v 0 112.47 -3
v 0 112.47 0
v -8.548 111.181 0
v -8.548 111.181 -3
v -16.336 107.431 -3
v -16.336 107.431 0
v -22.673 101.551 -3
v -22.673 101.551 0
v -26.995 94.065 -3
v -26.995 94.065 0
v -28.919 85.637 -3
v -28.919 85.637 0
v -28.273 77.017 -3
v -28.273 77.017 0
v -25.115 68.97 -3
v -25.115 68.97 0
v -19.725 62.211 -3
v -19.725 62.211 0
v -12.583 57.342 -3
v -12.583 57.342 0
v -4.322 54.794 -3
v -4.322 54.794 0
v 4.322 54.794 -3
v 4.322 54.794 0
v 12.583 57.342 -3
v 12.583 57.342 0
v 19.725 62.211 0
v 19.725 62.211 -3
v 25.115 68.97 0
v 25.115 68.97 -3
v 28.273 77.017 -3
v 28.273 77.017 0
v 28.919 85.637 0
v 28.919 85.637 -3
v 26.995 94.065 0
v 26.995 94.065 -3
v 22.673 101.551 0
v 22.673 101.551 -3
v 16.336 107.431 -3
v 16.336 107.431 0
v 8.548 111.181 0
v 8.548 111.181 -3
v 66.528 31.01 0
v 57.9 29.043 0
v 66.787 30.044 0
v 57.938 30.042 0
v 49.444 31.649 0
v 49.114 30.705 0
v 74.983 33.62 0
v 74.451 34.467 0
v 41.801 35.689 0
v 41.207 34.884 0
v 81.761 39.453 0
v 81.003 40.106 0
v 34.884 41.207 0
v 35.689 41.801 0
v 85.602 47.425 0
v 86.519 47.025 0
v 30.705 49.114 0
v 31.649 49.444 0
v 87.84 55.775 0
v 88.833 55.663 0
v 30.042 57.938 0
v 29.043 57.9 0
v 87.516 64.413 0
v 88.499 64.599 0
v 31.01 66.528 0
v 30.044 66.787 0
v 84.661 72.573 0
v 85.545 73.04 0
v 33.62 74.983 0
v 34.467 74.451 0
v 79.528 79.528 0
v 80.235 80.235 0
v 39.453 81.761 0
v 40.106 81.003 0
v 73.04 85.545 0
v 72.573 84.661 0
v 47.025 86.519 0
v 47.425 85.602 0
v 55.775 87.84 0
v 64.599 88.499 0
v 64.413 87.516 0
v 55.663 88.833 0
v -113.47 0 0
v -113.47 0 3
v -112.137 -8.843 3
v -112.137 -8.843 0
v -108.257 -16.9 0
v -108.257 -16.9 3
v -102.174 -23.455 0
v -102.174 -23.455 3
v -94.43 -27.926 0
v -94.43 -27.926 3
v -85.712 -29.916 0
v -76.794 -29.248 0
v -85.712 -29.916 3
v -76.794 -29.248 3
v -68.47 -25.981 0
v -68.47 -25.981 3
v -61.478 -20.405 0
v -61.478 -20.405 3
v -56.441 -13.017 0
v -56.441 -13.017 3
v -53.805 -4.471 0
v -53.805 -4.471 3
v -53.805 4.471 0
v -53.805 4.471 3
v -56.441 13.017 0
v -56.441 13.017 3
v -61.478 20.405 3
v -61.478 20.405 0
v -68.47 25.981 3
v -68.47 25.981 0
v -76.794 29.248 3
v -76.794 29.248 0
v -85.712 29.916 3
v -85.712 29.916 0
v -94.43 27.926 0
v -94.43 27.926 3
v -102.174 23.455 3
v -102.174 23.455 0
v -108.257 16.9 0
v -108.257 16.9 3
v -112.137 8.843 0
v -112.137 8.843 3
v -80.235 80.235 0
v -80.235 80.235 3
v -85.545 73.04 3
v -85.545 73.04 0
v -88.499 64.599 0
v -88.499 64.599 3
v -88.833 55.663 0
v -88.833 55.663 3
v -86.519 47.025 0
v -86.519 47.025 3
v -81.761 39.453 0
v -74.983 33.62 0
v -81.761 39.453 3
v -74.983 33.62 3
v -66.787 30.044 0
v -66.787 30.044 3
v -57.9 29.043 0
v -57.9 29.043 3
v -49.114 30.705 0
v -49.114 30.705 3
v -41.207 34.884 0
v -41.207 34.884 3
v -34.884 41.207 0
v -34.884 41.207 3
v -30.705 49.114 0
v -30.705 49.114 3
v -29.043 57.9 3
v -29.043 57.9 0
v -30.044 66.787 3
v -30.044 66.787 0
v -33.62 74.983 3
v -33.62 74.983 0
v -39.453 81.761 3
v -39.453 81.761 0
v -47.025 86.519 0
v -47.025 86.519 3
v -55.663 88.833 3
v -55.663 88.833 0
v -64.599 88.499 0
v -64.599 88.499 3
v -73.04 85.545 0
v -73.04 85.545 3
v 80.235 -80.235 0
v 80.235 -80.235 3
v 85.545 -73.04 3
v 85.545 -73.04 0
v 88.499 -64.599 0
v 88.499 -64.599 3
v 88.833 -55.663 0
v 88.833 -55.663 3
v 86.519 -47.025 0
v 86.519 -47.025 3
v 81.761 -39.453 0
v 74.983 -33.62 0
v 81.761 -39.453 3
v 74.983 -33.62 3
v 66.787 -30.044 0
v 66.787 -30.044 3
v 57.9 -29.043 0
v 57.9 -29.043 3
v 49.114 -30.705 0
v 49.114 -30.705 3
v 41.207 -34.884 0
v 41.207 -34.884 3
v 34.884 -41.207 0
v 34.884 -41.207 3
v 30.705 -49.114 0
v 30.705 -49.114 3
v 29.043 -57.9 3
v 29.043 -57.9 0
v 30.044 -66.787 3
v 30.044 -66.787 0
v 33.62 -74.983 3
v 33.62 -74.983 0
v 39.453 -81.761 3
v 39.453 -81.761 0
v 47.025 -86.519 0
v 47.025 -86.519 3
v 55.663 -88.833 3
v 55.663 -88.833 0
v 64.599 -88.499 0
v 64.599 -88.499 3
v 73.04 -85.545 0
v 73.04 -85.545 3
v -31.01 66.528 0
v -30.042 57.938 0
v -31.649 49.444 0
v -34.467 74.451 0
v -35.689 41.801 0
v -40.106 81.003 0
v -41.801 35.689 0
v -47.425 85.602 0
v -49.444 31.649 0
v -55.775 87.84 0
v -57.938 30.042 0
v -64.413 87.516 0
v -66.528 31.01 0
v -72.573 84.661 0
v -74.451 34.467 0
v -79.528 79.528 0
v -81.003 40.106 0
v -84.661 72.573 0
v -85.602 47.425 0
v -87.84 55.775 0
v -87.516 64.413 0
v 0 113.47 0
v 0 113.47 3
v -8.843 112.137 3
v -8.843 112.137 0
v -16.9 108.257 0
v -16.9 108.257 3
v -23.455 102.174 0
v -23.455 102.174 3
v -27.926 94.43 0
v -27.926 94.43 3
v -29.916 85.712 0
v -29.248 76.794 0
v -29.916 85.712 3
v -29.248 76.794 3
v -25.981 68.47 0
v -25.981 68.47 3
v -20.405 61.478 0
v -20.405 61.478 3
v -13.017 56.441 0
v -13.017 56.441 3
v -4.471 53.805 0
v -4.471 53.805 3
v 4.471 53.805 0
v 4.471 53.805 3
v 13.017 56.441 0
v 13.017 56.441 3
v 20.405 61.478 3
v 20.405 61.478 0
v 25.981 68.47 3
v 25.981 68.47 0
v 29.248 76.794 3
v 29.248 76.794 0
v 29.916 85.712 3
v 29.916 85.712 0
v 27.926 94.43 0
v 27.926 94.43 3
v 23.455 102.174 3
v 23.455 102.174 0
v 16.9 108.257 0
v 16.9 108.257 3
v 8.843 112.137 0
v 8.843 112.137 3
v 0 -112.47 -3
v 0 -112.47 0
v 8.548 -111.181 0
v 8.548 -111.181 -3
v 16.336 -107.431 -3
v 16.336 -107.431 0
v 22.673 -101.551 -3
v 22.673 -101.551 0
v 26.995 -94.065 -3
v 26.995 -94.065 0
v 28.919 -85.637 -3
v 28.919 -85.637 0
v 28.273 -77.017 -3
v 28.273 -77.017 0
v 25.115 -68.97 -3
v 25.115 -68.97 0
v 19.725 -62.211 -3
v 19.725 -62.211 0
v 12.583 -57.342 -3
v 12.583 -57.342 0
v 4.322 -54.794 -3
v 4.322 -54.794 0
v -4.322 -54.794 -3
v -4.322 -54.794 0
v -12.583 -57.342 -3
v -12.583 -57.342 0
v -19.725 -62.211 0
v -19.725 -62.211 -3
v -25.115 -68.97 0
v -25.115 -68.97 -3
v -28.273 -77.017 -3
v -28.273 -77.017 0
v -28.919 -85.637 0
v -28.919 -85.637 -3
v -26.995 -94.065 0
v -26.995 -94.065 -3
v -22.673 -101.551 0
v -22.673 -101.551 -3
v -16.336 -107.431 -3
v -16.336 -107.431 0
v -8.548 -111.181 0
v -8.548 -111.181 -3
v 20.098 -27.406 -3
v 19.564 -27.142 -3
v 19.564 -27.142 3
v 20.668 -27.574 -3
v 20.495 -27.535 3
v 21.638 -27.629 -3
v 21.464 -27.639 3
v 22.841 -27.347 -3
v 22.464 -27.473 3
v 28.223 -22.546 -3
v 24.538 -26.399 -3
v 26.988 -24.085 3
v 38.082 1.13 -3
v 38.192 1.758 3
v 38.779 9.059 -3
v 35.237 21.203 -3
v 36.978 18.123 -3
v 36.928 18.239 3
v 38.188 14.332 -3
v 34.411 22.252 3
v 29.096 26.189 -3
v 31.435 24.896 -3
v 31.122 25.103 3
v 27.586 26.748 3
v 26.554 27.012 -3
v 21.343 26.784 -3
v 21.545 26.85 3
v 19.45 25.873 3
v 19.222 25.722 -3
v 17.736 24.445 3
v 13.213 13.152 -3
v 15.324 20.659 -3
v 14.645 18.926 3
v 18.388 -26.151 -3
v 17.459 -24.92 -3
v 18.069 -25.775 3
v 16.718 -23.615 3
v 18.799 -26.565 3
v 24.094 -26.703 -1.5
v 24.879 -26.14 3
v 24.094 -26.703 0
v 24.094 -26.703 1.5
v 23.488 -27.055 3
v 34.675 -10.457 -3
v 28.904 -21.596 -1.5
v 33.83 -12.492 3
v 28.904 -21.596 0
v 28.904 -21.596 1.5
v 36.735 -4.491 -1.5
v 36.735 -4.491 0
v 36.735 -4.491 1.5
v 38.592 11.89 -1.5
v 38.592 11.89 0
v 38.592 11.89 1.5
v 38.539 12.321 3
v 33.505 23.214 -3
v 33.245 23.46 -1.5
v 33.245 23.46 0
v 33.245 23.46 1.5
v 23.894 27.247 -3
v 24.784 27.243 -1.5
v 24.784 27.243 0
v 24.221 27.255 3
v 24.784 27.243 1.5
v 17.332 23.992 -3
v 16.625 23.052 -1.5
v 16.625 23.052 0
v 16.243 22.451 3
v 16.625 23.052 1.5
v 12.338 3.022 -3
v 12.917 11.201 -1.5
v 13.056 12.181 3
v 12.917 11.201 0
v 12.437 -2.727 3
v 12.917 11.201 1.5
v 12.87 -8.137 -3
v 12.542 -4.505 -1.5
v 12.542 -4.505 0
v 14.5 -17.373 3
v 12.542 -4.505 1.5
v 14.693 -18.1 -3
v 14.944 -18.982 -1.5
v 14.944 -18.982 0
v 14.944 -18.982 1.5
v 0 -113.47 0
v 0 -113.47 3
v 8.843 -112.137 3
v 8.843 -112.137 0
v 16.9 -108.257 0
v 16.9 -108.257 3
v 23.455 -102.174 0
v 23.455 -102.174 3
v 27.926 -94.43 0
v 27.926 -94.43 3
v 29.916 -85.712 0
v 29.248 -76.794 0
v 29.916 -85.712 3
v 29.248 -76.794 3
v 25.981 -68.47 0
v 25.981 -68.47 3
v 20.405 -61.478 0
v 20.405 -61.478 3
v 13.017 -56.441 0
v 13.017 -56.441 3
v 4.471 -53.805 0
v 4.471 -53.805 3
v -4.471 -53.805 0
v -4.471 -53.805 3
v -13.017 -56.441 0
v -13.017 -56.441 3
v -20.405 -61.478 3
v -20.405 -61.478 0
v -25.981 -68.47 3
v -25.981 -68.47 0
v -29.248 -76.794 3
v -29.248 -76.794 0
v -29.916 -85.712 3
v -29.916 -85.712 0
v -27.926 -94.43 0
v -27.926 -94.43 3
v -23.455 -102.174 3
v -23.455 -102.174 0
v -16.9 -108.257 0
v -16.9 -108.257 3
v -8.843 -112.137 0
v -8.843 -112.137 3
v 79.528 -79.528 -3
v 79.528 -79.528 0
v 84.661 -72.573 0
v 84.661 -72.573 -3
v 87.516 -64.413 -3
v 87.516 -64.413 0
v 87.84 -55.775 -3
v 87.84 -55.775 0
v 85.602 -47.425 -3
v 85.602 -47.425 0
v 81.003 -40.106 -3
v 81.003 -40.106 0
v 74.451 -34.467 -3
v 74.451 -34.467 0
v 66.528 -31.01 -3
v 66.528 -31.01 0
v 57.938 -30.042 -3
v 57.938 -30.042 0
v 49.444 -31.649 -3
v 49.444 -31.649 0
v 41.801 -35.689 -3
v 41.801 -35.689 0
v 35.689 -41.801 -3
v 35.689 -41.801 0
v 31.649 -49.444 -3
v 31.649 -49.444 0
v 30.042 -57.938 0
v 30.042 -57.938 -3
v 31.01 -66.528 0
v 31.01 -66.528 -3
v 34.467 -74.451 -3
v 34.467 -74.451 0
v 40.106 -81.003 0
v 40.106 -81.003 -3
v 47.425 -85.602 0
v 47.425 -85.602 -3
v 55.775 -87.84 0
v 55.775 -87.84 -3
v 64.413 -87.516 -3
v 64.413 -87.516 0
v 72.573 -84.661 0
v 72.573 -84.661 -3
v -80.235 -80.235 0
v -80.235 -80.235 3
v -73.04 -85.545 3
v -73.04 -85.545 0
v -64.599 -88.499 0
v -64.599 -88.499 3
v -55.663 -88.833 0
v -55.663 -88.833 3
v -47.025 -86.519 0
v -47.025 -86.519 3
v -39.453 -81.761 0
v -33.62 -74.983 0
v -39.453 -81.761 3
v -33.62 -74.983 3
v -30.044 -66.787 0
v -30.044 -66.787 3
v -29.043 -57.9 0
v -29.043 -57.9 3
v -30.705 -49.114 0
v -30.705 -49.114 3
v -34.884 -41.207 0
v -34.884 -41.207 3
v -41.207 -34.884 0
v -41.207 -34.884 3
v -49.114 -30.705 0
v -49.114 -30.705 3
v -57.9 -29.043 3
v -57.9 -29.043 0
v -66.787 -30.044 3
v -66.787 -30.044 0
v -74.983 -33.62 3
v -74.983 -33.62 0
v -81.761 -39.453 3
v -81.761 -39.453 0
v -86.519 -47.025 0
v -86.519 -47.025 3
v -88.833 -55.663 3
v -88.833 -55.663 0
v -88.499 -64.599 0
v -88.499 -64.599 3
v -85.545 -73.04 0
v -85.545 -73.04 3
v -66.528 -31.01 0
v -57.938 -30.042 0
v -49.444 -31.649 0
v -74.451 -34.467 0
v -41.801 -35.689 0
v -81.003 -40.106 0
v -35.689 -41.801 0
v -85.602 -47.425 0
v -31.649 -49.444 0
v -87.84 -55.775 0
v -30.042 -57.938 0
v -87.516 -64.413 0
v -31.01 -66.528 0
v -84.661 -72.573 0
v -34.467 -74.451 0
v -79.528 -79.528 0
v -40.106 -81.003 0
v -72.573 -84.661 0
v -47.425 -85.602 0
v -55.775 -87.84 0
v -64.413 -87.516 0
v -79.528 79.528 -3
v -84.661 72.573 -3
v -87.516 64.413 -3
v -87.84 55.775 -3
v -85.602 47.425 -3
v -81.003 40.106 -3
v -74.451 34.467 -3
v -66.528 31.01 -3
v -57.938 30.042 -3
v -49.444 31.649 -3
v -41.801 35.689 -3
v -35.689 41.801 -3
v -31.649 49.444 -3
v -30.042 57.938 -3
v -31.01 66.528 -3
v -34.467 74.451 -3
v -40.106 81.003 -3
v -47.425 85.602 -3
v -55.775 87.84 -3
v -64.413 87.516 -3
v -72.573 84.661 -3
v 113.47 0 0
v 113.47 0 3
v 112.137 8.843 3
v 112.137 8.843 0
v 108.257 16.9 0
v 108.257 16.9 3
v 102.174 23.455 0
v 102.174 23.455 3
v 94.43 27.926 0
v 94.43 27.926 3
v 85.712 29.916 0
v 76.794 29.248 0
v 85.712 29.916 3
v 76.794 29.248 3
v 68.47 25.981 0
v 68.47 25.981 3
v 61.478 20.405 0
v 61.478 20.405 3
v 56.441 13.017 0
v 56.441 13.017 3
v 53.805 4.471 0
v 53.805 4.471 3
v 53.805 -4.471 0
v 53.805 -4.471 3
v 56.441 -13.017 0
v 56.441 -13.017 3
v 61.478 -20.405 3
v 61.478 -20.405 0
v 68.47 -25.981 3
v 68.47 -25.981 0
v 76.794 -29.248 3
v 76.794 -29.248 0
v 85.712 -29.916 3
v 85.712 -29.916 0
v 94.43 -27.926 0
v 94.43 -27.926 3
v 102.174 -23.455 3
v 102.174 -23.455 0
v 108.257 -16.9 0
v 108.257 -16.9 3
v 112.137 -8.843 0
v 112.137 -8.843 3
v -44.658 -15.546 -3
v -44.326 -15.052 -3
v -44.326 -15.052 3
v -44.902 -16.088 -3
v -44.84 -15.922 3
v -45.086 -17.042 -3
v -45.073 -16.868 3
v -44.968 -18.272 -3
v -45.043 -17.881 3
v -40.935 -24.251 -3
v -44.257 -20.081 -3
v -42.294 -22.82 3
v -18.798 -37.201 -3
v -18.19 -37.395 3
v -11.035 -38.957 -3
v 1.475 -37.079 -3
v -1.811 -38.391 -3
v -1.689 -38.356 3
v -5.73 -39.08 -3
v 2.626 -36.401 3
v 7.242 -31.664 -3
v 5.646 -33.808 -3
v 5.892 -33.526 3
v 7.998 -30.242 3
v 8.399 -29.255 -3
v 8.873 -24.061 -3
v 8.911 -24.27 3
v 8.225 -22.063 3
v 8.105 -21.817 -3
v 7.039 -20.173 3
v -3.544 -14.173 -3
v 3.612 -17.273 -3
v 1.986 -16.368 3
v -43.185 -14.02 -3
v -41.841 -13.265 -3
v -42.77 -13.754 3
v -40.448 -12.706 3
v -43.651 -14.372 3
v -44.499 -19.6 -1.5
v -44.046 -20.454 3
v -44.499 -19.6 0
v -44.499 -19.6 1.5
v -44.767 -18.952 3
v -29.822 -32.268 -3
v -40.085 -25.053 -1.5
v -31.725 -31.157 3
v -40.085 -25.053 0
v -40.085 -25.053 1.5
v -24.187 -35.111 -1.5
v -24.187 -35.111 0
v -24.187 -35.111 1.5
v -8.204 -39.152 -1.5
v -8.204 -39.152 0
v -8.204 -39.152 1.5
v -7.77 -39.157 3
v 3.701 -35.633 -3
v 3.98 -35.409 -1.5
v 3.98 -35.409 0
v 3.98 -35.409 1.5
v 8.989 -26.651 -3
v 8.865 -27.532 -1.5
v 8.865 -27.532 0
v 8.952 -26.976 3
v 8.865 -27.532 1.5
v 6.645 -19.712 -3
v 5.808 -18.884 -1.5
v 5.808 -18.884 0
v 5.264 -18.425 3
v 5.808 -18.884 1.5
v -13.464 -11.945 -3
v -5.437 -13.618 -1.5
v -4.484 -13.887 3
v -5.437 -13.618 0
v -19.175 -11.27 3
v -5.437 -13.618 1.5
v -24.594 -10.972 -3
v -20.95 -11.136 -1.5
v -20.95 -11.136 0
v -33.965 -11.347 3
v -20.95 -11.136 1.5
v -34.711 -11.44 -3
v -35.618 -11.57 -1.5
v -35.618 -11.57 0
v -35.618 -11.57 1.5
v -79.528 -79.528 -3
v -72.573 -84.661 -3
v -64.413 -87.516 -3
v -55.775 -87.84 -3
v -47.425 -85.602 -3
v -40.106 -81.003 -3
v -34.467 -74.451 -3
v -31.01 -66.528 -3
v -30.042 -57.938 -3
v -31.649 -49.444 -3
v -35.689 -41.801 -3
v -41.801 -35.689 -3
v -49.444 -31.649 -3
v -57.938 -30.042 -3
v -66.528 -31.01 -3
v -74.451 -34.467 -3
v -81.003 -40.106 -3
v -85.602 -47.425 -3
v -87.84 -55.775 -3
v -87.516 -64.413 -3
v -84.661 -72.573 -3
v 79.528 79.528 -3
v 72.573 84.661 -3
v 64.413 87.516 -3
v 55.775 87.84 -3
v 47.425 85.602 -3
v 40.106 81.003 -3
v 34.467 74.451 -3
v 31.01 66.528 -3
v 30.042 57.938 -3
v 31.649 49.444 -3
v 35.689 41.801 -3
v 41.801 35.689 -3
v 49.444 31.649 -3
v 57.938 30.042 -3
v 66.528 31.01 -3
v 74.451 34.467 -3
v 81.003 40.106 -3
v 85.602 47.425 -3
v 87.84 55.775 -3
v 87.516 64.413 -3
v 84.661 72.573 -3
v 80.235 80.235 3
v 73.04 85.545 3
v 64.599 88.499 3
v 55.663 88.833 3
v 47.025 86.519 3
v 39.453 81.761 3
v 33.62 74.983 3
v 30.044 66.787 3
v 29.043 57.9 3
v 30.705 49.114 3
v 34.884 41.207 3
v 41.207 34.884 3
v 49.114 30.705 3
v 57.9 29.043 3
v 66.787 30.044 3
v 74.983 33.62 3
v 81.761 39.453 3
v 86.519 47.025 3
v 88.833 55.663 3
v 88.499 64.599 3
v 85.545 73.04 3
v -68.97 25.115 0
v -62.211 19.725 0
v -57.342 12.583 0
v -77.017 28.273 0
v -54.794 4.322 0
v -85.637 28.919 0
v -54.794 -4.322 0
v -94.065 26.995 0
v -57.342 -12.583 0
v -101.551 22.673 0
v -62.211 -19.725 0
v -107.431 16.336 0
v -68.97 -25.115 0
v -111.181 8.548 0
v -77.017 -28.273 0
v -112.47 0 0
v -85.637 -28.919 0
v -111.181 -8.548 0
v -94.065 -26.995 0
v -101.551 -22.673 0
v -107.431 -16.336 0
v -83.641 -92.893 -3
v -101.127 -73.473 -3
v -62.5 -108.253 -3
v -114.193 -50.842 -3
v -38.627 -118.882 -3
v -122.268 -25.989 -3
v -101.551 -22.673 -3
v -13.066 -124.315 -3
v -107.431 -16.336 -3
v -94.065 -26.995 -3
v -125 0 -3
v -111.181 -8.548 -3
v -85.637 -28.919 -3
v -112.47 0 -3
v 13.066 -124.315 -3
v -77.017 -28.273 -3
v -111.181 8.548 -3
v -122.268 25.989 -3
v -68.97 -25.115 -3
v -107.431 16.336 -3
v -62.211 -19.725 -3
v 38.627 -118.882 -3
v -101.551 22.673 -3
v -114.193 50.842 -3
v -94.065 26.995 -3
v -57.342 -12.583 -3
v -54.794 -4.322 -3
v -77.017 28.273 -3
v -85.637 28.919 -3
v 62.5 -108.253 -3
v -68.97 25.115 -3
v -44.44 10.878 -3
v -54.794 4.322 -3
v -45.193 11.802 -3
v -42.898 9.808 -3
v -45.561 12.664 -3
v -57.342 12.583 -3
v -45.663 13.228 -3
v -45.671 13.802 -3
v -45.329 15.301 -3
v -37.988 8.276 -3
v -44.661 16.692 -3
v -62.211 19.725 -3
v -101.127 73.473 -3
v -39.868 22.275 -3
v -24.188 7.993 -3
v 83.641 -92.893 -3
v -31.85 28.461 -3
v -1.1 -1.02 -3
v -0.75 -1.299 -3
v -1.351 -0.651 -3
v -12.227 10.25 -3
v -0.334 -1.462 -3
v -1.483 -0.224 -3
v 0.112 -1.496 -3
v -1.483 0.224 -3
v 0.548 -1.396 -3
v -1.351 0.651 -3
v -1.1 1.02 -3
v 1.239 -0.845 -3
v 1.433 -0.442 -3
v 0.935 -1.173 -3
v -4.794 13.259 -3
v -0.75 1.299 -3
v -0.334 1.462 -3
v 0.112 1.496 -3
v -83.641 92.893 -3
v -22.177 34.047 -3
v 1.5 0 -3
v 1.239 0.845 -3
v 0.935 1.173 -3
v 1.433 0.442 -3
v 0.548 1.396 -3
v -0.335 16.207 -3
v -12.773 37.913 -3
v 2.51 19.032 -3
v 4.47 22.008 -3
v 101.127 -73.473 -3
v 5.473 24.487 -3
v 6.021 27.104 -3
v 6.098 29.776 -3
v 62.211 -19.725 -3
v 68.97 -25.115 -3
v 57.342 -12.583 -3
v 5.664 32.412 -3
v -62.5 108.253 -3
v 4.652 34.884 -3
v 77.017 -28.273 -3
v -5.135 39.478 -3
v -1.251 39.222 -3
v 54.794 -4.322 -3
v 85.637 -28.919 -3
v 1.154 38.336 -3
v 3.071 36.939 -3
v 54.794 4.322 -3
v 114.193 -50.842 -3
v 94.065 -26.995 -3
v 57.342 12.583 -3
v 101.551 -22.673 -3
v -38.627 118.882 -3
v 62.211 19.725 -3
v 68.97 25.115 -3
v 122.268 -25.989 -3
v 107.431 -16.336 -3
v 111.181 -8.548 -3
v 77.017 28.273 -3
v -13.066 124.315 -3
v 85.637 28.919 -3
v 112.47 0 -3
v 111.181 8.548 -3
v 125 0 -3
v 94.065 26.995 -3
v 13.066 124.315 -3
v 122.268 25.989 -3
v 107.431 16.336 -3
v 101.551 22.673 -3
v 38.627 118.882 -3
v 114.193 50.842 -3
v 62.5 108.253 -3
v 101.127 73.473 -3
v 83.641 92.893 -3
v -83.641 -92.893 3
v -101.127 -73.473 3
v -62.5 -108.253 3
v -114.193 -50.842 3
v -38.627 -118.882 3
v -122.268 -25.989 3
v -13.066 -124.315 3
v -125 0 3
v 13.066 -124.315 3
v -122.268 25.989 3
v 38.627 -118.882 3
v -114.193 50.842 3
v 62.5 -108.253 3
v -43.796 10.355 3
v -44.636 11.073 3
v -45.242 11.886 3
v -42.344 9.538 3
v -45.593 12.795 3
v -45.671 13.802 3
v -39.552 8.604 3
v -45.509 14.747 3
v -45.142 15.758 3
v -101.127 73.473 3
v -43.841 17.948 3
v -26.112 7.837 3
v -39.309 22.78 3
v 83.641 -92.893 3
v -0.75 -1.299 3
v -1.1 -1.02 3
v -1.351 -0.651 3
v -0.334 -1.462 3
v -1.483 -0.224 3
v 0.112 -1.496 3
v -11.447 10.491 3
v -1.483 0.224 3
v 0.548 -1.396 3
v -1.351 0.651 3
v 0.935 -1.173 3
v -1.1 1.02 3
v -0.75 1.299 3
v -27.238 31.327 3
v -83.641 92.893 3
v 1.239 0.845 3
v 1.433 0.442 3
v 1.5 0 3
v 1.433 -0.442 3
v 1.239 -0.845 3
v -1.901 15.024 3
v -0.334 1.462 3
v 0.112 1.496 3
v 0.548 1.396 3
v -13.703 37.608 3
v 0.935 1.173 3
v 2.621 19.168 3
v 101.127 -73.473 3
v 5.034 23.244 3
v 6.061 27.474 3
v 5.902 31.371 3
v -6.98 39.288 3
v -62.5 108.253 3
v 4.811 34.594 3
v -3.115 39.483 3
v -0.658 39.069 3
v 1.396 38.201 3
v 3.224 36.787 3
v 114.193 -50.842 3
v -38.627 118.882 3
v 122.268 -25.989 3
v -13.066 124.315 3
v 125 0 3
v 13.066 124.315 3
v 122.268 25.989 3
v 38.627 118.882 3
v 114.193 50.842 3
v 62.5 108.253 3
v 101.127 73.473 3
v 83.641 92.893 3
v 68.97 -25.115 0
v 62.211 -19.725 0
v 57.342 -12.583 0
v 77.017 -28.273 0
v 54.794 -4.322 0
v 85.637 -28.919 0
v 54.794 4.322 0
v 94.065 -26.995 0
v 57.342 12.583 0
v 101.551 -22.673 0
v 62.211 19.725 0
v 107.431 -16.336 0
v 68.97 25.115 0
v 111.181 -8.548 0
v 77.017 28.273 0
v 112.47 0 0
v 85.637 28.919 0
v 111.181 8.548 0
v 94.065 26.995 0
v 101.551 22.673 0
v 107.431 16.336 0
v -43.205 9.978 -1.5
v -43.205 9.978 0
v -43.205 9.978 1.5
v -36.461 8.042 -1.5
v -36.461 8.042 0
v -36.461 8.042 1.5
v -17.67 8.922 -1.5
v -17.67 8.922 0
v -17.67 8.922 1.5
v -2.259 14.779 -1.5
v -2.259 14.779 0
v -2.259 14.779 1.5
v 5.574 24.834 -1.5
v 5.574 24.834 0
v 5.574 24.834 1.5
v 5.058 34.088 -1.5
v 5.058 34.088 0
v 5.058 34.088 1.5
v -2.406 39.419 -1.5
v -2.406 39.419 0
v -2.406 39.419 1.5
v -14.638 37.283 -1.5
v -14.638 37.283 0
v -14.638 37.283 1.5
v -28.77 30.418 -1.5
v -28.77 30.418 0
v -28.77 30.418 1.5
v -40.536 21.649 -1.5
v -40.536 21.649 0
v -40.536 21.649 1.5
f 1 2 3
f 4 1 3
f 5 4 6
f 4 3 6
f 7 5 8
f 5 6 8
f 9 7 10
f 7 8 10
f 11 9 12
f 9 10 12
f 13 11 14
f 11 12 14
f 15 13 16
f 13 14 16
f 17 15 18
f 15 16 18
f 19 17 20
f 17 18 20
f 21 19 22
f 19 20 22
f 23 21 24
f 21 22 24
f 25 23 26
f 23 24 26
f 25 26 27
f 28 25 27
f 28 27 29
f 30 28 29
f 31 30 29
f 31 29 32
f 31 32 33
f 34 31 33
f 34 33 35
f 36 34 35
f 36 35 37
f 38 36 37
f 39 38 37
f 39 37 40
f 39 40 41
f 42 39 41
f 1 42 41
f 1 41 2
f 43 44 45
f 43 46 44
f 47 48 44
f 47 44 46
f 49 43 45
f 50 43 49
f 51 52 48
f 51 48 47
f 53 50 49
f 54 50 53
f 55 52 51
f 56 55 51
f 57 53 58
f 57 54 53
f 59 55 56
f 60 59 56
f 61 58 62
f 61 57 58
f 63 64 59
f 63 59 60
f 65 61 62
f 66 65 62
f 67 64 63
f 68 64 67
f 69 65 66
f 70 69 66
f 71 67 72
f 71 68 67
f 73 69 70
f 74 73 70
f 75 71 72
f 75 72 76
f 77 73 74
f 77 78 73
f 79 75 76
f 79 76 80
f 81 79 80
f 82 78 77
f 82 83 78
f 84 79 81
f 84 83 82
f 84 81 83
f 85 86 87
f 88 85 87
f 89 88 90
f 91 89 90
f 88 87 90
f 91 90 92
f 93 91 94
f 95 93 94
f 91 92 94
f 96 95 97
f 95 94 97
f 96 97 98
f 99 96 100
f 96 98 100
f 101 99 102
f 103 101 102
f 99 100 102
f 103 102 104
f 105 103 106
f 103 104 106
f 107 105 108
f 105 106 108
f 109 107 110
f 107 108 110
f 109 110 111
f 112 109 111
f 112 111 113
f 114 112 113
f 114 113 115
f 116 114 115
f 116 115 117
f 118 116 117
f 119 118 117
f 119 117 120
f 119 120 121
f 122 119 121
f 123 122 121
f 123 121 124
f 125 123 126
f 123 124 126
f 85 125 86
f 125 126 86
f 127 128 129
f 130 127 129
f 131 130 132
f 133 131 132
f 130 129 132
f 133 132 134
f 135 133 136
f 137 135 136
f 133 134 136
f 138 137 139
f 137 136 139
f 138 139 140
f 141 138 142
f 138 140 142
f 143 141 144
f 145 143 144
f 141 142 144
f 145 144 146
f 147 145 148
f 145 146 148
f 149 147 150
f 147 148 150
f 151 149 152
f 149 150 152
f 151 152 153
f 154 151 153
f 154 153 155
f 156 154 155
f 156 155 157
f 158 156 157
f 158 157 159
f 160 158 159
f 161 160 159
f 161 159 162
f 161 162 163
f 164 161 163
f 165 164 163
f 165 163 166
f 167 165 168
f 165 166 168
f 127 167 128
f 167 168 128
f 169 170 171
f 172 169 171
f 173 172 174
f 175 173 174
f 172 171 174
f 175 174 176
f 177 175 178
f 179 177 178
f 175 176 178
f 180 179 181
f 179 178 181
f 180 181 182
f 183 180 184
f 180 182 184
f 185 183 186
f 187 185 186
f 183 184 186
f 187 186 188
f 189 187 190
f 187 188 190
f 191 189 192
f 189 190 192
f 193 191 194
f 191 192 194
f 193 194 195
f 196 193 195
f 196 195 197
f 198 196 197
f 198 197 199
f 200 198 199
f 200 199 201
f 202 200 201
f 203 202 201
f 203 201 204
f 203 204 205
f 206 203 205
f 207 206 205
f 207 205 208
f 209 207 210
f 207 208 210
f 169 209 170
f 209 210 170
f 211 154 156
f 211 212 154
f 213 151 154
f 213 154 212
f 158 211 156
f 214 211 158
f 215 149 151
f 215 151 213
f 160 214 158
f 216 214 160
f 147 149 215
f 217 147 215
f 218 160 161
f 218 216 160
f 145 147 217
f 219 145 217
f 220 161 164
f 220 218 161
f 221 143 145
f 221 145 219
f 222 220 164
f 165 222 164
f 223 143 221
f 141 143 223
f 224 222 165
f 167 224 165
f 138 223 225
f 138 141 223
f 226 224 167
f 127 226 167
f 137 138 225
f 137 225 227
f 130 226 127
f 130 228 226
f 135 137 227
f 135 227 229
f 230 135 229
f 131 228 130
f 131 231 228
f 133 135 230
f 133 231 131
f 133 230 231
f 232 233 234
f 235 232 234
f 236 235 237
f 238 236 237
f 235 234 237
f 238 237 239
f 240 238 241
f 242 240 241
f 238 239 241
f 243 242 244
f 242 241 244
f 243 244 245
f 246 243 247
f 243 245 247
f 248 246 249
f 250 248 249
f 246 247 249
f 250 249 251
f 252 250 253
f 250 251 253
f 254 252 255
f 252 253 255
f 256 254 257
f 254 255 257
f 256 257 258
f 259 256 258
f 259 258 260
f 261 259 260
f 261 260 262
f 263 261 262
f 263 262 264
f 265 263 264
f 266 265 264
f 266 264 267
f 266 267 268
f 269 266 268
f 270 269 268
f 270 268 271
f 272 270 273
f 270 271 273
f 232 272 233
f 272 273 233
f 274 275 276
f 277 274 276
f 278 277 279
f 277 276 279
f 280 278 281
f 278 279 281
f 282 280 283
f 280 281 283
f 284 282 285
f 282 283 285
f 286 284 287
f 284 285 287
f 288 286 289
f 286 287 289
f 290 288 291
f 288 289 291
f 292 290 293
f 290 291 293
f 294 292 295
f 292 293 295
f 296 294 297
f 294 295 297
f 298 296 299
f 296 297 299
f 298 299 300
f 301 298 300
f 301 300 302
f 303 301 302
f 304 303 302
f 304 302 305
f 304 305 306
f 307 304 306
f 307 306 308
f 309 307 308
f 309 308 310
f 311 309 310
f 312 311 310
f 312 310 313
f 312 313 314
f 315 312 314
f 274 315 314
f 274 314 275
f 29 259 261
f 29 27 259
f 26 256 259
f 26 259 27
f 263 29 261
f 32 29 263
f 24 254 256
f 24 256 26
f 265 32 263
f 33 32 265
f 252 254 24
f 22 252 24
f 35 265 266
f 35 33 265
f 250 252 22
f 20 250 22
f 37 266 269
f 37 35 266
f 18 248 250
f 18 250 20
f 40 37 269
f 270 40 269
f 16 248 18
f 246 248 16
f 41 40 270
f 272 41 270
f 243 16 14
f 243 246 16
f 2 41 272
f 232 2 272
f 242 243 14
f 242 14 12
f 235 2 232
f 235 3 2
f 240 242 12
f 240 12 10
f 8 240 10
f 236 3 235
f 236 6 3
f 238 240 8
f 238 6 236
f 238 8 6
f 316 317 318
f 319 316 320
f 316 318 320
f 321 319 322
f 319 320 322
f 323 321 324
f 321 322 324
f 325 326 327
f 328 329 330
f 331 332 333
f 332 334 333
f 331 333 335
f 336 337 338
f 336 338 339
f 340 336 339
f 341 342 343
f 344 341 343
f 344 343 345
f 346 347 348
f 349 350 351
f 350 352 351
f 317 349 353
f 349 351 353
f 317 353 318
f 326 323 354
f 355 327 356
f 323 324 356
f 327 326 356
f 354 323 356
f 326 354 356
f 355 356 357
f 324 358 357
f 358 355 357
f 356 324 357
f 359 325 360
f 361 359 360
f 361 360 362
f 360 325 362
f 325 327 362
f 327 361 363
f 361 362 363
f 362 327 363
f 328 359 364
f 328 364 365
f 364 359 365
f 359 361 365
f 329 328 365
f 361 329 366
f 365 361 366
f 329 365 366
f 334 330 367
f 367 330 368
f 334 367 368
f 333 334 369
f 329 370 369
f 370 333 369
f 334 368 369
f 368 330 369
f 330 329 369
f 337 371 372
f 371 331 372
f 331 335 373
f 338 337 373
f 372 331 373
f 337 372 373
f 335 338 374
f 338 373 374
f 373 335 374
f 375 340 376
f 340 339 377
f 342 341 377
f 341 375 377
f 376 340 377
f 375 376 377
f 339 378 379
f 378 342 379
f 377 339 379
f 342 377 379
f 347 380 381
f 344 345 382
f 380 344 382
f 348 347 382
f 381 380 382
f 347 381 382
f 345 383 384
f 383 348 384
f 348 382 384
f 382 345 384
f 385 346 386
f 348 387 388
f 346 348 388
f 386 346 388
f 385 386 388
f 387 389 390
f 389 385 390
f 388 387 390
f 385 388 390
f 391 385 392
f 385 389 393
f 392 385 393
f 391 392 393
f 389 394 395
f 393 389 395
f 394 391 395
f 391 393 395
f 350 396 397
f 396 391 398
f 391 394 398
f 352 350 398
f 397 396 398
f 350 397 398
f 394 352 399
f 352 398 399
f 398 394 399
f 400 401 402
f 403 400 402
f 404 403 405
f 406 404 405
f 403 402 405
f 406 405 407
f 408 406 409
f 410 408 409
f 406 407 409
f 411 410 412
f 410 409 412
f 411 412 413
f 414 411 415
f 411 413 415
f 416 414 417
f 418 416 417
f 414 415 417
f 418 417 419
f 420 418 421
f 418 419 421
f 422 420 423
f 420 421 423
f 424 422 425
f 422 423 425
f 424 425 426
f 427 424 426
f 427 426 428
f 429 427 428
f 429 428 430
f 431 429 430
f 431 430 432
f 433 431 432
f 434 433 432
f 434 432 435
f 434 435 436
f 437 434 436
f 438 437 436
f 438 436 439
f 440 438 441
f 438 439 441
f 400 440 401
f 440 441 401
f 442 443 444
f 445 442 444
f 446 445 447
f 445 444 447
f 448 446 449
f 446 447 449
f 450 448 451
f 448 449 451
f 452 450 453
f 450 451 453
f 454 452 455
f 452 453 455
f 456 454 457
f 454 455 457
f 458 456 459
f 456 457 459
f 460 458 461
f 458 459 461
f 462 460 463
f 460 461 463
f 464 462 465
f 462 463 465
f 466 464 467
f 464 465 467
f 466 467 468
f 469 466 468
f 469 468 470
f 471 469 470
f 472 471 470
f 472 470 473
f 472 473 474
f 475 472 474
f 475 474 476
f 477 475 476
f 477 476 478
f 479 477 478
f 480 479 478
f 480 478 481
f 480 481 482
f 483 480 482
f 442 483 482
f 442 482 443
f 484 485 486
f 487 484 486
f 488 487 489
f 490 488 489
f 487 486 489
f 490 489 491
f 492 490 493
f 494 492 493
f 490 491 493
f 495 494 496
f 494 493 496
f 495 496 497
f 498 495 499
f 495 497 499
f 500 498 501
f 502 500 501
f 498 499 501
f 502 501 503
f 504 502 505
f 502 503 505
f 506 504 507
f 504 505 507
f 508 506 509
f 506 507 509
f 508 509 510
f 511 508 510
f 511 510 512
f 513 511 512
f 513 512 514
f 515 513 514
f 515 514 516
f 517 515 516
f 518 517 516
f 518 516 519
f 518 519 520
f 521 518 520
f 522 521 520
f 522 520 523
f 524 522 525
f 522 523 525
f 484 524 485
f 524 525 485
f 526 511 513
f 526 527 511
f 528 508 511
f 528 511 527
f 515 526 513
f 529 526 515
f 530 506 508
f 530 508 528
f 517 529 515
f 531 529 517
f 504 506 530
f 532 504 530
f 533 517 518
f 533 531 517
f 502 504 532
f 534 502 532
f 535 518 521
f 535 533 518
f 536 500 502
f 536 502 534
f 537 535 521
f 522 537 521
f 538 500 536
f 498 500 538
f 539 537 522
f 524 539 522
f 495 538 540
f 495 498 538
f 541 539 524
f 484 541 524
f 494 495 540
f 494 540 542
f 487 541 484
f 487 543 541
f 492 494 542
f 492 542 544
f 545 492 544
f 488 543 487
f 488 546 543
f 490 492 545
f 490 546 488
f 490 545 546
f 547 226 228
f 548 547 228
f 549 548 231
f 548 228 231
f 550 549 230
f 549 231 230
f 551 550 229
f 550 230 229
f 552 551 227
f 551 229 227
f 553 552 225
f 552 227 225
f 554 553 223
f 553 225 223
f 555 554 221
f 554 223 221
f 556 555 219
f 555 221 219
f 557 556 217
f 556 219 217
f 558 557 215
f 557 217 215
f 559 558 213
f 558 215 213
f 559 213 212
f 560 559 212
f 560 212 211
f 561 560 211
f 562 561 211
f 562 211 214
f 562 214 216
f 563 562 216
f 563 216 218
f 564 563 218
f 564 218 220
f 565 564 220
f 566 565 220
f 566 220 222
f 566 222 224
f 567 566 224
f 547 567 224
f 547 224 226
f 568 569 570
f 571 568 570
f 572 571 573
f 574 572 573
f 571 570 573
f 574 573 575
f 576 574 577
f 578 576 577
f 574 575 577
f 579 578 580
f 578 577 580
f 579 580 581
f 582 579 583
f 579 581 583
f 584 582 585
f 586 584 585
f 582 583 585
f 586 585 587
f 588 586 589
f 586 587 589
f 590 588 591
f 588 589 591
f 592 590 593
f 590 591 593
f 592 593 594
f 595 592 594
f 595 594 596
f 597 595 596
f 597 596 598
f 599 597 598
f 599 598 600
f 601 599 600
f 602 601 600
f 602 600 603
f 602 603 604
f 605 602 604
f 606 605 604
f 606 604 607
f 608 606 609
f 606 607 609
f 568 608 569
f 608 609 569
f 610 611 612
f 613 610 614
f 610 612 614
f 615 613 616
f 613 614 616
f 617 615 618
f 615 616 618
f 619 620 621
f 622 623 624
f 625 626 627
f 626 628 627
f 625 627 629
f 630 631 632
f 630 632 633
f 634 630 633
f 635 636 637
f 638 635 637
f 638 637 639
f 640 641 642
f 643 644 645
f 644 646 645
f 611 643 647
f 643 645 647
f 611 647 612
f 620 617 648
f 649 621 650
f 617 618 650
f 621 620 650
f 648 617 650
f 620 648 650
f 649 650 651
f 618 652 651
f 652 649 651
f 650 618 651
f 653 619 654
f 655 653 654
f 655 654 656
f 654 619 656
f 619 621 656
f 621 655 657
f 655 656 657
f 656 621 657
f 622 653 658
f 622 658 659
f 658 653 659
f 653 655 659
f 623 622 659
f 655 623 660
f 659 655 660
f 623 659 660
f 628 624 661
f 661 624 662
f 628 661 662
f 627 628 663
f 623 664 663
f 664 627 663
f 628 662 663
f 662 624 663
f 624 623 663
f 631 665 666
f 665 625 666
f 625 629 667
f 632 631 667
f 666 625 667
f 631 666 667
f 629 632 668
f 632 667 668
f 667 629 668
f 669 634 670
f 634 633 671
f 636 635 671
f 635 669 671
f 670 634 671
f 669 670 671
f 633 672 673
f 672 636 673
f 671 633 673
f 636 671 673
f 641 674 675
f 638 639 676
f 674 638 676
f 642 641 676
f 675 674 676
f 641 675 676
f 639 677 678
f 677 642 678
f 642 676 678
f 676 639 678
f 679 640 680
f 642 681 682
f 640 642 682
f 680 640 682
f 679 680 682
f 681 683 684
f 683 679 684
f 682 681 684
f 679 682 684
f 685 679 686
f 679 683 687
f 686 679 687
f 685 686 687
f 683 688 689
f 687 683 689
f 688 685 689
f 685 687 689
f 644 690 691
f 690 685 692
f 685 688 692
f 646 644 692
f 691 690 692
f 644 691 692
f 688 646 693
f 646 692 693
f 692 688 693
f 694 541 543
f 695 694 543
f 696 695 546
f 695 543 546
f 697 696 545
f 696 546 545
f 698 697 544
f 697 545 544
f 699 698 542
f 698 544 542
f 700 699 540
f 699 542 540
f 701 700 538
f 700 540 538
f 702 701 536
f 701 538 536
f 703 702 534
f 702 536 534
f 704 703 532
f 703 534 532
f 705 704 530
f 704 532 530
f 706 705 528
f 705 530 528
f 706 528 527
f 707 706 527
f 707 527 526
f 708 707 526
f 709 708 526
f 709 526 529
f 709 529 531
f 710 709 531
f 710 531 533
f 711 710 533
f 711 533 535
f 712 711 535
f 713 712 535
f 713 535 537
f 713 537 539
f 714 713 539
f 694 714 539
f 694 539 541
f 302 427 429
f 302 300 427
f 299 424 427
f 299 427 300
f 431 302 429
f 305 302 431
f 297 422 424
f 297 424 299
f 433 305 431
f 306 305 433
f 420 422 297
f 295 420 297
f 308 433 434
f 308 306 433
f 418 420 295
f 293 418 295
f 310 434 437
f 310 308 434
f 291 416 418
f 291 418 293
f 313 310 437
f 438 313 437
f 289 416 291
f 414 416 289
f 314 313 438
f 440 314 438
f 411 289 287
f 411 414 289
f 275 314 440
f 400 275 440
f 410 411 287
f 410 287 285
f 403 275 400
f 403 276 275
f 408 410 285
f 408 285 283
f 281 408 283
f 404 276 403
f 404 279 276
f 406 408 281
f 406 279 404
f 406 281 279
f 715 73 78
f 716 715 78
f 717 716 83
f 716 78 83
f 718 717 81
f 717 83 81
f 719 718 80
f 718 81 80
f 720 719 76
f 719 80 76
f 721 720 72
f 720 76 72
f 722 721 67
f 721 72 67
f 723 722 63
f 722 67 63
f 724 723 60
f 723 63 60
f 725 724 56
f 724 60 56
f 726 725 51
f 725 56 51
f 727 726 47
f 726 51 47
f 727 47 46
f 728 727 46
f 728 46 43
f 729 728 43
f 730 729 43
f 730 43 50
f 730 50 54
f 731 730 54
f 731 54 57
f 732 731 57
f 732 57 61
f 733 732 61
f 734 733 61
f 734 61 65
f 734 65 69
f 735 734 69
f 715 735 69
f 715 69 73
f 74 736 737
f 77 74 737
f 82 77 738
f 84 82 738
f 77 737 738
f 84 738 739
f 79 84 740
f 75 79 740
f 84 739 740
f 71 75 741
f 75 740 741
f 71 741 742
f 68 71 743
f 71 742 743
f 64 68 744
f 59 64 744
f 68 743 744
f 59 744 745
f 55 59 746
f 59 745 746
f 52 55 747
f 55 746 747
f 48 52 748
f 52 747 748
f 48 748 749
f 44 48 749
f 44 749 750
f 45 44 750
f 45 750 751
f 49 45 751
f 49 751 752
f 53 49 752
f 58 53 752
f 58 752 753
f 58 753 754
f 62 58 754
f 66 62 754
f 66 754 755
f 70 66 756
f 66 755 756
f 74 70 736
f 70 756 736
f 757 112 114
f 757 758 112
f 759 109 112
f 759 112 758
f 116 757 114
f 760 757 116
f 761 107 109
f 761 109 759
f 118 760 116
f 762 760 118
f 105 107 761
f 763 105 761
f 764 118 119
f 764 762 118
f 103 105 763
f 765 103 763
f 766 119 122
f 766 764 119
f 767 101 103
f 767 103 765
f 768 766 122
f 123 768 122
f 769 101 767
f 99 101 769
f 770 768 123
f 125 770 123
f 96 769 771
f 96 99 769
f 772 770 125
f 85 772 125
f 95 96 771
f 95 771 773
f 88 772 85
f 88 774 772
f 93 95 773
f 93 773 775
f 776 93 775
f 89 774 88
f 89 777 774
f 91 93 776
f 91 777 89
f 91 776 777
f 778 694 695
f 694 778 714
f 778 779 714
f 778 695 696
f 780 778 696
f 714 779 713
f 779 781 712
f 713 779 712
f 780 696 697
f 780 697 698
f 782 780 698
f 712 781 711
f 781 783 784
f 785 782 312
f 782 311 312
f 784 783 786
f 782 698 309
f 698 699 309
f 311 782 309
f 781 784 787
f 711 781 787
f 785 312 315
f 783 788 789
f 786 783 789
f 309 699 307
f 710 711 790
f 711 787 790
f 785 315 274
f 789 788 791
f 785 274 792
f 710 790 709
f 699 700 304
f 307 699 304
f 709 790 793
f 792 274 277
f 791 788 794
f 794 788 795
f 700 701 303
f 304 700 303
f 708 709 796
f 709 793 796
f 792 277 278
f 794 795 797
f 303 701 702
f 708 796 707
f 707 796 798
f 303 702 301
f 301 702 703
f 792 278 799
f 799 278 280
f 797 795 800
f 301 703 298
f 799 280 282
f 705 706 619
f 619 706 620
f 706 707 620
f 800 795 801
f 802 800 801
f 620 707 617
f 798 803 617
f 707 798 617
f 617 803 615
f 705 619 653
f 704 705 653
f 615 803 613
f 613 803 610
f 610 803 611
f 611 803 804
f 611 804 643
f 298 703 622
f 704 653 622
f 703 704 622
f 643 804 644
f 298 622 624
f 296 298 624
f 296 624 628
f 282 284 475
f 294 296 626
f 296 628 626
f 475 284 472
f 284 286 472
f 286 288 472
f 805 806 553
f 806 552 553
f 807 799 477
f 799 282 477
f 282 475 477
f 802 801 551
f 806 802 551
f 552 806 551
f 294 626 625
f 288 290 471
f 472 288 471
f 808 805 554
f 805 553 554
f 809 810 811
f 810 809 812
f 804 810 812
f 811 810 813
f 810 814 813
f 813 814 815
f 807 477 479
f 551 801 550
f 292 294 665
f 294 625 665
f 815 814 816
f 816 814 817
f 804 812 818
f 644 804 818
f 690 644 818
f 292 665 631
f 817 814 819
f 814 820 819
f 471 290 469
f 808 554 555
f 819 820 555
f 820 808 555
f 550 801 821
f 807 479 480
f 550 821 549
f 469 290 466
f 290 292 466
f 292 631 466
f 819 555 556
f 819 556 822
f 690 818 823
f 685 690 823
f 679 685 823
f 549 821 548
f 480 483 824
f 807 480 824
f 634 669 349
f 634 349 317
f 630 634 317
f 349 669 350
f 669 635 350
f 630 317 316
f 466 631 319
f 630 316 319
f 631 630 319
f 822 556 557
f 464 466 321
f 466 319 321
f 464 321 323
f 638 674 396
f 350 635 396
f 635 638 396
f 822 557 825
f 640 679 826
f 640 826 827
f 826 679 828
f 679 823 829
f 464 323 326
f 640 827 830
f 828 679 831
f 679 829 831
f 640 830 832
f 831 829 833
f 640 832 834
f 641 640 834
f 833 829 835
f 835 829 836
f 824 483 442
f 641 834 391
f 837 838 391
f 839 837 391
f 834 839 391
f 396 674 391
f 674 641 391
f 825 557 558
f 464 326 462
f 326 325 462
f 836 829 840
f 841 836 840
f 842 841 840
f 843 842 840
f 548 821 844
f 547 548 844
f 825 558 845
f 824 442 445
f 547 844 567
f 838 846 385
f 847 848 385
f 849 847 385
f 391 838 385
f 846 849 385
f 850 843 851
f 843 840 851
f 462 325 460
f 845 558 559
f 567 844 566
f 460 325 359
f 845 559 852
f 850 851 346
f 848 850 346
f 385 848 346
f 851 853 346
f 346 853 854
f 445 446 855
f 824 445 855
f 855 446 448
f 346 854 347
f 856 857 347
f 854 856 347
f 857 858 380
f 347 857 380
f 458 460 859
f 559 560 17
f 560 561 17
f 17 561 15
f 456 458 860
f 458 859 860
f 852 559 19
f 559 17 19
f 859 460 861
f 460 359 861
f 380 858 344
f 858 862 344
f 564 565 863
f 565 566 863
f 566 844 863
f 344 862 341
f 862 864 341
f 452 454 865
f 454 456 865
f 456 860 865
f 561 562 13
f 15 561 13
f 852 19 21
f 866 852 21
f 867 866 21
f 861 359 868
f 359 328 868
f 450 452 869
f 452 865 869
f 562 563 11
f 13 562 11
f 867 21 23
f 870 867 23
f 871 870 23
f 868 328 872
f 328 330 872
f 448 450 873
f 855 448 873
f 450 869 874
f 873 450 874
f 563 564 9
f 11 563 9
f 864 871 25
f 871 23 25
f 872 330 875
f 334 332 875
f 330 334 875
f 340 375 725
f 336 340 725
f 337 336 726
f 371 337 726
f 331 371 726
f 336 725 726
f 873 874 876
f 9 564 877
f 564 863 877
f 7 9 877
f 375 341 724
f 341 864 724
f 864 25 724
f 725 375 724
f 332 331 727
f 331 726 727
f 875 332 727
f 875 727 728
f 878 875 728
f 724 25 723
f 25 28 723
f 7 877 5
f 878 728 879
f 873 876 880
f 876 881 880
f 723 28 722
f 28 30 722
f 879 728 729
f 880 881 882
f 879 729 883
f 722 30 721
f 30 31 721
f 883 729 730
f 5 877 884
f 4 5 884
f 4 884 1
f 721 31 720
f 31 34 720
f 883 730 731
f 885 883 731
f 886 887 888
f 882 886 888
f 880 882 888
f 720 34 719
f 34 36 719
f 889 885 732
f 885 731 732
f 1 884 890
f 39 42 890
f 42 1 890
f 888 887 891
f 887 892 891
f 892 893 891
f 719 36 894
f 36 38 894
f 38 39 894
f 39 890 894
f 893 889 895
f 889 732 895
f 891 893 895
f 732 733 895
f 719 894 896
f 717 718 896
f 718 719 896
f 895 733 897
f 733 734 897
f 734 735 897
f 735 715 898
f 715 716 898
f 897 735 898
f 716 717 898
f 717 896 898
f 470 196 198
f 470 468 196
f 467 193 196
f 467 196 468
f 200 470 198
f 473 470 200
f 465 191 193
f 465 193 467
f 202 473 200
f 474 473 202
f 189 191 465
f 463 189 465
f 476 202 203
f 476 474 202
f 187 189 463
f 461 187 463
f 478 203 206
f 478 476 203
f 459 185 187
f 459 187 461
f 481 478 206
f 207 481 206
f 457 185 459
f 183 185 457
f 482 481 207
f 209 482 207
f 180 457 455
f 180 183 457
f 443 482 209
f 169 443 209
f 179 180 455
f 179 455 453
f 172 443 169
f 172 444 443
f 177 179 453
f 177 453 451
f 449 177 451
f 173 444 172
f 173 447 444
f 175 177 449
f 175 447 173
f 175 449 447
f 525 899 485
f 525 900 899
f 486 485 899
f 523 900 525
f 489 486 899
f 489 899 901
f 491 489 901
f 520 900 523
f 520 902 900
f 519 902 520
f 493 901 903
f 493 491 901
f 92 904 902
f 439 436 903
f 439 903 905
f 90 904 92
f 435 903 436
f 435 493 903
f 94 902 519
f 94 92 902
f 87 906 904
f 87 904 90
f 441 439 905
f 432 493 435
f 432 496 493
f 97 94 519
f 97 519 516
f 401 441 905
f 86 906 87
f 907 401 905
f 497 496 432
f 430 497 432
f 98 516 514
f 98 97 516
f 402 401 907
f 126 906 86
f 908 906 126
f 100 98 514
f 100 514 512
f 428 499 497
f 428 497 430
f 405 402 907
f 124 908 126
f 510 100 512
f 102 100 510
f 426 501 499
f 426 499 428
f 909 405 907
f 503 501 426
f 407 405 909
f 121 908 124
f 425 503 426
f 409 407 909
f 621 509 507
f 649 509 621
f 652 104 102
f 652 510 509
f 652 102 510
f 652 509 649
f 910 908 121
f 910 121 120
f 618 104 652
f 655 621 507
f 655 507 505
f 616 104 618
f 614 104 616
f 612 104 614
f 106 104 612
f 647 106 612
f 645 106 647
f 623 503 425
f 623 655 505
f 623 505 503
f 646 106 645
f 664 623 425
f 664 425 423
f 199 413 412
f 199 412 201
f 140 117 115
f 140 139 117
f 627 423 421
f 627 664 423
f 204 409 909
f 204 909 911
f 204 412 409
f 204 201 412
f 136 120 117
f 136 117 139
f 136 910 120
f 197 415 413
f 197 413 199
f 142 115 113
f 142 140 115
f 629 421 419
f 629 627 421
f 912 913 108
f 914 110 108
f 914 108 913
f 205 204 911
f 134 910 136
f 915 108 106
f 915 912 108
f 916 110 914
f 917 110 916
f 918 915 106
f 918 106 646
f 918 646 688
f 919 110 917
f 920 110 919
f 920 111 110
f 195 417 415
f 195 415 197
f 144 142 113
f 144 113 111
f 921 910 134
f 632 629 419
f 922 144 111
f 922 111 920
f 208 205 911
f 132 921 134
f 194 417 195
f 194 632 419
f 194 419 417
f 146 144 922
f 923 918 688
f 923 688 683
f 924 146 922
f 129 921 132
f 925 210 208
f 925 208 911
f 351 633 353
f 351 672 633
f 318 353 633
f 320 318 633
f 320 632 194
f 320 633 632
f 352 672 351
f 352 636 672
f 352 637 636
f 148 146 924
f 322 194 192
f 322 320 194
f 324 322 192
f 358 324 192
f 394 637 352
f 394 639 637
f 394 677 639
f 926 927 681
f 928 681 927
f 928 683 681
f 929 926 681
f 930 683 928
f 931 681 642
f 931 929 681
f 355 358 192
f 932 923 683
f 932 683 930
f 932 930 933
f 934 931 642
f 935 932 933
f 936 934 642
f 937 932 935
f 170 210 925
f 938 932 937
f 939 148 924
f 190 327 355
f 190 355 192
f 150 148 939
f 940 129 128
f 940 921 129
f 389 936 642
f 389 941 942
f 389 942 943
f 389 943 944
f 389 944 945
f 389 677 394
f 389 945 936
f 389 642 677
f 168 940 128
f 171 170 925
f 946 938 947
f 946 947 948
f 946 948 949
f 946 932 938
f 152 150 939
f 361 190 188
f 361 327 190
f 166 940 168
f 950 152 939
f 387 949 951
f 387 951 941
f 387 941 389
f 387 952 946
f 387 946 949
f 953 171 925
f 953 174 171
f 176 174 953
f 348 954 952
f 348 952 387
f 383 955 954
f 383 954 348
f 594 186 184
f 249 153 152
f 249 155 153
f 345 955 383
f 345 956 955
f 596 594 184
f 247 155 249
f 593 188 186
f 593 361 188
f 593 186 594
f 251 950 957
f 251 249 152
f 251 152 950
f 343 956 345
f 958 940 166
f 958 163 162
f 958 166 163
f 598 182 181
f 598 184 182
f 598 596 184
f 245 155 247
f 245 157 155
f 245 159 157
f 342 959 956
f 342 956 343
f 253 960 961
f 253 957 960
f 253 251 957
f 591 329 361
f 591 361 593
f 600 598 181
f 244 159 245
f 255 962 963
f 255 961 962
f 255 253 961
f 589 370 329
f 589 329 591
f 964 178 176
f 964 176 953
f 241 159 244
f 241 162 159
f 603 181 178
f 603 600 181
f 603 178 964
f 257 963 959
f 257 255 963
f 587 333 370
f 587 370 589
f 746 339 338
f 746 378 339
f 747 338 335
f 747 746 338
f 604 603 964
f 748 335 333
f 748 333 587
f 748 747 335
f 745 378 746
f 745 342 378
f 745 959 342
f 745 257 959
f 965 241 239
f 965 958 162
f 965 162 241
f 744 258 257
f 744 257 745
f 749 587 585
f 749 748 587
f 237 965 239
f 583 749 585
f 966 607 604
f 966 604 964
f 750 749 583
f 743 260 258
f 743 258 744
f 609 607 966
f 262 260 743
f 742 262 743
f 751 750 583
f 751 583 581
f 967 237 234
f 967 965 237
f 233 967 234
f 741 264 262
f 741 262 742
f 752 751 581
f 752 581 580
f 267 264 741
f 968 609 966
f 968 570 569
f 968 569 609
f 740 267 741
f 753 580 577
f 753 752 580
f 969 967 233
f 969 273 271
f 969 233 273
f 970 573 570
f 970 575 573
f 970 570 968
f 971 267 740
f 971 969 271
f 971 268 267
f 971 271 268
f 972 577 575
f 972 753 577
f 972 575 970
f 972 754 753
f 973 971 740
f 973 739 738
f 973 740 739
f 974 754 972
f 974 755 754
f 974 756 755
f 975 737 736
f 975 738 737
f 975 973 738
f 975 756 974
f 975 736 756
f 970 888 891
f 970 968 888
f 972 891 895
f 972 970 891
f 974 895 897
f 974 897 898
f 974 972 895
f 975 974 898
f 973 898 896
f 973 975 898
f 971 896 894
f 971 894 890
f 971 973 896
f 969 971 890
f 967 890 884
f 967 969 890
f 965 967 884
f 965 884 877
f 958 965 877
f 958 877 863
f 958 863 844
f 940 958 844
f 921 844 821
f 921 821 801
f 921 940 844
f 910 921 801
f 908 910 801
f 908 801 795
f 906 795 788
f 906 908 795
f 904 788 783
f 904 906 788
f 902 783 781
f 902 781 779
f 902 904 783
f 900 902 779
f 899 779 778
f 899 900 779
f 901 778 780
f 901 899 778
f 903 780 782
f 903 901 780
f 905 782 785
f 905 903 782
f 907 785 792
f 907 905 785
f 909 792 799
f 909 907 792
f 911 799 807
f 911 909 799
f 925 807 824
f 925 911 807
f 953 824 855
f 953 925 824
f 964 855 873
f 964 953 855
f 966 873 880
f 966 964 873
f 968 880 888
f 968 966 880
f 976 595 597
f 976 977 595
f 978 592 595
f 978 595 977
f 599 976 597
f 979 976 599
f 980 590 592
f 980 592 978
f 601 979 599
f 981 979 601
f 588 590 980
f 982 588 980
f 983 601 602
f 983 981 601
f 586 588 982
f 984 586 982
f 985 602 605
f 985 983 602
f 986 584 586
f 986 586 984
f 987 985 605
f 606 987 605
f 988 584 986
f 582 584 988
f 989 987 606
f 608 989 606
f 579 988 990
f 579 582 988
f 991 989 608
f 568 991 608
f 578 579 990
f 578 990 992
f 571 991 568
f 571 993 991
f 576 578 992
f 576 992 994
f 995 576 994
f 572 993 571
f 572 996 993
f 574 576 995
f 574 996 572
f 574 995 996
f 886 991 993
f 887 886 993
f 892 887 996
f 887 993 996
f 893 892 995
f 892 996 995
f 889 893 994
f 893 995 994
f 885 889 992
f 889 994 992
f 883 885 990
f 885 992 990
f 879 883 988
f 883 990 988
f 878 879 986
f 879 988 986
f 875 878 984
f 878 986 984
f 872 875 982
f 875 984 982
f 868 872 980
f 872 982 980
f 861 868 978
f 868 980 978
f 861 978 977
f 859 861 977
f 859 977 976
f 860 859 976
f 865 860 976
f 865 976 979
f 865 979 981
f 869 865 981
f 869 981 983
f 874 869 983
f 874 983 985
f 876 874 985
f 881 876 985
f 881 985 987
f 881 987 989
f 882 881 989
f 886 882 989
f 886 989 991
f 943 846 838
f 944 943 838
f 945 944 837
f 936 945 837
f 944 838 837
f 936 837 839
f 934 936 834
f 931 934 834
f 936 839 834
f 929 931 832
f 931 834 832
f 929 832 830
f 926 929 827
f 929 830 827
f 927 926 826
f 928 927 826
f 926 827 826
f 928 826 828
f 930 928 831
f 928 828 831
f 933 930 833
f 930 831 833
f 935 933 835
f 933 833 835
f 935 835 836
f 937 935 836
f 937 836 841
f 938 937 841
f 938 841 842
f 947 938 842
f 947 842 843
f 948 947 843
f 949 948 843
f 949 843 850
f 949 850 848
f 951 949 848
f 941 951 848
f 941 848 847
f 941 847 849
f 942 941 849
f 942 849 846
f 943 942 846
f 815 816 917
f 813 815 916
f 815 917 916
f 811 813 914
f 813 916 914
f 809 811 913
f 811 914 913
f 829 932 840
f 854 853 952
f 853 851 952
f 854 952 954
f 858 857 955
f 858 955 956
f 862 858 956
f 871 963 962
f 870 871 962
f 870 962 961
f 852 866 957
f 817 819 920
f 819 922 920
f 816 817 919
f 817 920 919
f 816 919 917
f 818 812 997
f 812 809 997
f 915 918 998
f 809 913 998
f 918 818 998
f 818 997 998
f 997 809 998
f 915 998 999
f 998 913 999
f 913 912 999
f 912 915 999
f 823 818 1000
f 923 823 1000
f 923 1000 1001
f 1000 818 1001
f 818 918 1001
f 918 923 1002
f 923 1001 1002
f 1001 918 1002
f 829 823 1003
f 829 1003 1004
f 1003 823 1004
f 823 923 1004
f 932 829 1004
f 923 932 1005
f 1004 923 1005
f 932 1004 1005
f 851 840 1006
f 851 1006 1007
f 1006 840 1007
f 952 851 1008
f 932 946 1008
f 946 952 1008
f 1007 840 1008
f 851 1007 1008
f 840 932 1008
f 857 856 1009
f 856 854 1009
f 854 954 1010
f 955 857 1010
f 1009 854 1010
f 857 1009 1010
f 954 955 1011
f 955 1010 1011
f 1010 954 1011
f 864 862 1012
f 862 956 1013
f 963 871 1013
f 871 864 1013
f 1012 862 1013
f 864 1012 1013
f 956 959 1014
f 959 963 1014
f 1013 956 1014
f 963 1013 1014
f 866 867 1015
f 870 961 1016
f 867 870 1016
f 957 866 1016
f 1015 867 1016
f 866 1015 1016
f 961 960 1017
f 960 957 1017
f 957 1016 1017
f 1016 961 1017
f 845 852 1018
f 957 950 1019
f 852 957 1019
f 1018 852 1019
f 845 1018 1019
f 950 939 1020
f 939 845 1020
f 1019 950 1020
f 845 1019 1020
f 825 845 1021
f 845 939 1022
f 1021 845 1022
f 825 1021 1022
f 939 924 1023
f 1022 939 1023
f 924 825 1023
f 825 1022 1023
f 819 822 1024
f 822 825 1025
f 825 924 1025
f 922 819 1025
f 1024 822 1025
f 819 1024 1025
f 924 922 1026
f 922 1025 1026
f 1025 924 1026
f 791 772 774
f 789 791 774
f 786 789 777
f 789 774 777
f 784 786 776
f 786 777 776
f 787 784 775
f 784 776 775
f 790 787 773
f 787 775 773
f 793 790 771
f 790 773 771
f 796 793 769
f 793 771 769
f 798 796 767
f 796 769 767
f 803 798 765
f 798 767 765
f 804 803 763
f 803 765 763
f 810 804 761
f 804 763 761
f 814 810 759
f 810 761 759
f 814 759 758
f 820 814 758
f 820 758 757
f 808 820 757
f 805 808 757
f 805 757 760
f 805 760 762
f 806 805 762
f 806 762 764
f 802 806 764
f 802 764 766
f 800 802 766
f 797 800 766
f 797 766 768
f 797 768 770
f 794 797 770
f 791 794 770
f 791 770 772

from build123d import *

# Parameters (mm, degrees)
F0_R            = 125
F1_DEPTH        = 3
F2_R            = 1.5
F3_DEPTH        = 6.001
F5_R            = 29
F6_DEPTH        = 6.001
F6_COPIES_COUNT = 8
F5_R_2          = 30
F7_DEPTH        = 3
F7_COPIES_COUNT = 8
F9_DEPTH        = 6.001


# Not quite as in the source:
# - a pattern or mirror of a feature is missing from the dataset's text; its kind, count and spacing are read off the source's solid


with BuildPart() as f1:
    # F0 (on Top) → F1 (new body, symmetric)
    with BuildSketch(Plane.XY):
        Circle(F0_R)
    extrude(amount=F1_DEPTH, both=True)

    # F2 (on face) → F3 (cut, through all)
    with BuildSketch(Plane(origin=(0, 0, -3), x_dir=(1, 0, 0), z_dir=(0, 0, -1))):
        Circle(F2_R)
    extrude(amount=-F3_DEPTH, mode=Mode.SUBTRACT)

    # F5 (on face) → F6 (cut, through all)
    with BuildSketch(Plane.XY.offset(3)):
        with Locations((83.46965909, 0)):
            Circle(F5_R)
    f6 = extrude(amount=-F6_DEPTH, mode=Mode.SUBTRACT)

    # F6_copies: F6 ×8 about axis
    f6_copies_axis = Axis((0, 0, 0), (0, 0, 1))
    for i in range(1, F6_COPIES_COUNT):
        add(f6.rotate(f6_copies_axis, i * 360 / F6_COPIES_COUNT), mode=Mode.SUBTRACT)

    # F5 (on face) → F7 (cut)
    with BuildSketch(Plane.XY.offset(3)):
        with Locations((83.46965909, 0)):
            Circle(F5_R_2)
        with Locations((83.46965909, 0)):
            Circle(F5_R, mode=Mode.SUBTRACT)
    f7 = extrude(amount=-F7_DEPTH, mode=Mode.SUBTRACT)

    # F7_copies: F7 ×8 about axis
    f7_copies_axis = Axis((0, 0, 0), (0, 0, 1))
    for i in range(1, F7_COPIES_COUNT):
        add(f7.rotate(f7_copies_axis, i * 360 / F7_COPIES_COUNT), mode=Mode.SUBTRACT)

    # F8 (on face) → F9 (cut, through all)
    with BuildSketch(Plane.XY.offset(3)):
        with BuildLine():
            add(Edge.make_bspline(
                [(-44.3258620799, -15.0524862111), (-48.3588050122, -20.1152564211), (-23.0924792953, -39.7830257512), (5.512565217, -41.0118510348), (16.0001607542, -11.0681310793), (-38.9619666275, -8.3188997057), (-44.3258620799, -15.0524862111)],
                knots=[0, 0, 0, 0, 0.2444791319, 0.4878585615, 0.6748378229, 1, 1, 1, 1], degree=3))
        make_face()
        with BuildLine():
            add(Edge.make_bspline(
                [(-45.671308504, 13.8018518265), (-46.0710162563, 7.3414722241), (-14.0930848504, 5.7227478351), (10.0436210659, 21.123332585), (1.4595442067, 51.6672296743), (-45.1396891305, 22.3942870163), (-45.671308504, 13.8018518265)],
                knots=[0, 0, 0, 0, 0.2444791319, 0.4878585615, 0.6748378229, 1, 1, 1, 1], degree=3))
        make_face()
        with BuildLine():
            add(Edge.make_bspline(
                [(19.5642778018, -27.1424591751), (25.1230293593, -30.4585641219), (41.2175010078, -2.7786734428), (38.591626534, 25.7320853401), (7.5102643018, 32.1011470227), (12.1710260995, -22.7319727037), (19.5642778018, -27.1424591751)],
                knots=[0, 0, 0, 0, 0.2444791319, 0.4878585615, 0.6748378229, 1, 1, 1, 1], degree=3))
        make_face()
    extrude(amount=-F9_DEPTH, mode=Mode.SUBTRACT)


solid = f1.part
